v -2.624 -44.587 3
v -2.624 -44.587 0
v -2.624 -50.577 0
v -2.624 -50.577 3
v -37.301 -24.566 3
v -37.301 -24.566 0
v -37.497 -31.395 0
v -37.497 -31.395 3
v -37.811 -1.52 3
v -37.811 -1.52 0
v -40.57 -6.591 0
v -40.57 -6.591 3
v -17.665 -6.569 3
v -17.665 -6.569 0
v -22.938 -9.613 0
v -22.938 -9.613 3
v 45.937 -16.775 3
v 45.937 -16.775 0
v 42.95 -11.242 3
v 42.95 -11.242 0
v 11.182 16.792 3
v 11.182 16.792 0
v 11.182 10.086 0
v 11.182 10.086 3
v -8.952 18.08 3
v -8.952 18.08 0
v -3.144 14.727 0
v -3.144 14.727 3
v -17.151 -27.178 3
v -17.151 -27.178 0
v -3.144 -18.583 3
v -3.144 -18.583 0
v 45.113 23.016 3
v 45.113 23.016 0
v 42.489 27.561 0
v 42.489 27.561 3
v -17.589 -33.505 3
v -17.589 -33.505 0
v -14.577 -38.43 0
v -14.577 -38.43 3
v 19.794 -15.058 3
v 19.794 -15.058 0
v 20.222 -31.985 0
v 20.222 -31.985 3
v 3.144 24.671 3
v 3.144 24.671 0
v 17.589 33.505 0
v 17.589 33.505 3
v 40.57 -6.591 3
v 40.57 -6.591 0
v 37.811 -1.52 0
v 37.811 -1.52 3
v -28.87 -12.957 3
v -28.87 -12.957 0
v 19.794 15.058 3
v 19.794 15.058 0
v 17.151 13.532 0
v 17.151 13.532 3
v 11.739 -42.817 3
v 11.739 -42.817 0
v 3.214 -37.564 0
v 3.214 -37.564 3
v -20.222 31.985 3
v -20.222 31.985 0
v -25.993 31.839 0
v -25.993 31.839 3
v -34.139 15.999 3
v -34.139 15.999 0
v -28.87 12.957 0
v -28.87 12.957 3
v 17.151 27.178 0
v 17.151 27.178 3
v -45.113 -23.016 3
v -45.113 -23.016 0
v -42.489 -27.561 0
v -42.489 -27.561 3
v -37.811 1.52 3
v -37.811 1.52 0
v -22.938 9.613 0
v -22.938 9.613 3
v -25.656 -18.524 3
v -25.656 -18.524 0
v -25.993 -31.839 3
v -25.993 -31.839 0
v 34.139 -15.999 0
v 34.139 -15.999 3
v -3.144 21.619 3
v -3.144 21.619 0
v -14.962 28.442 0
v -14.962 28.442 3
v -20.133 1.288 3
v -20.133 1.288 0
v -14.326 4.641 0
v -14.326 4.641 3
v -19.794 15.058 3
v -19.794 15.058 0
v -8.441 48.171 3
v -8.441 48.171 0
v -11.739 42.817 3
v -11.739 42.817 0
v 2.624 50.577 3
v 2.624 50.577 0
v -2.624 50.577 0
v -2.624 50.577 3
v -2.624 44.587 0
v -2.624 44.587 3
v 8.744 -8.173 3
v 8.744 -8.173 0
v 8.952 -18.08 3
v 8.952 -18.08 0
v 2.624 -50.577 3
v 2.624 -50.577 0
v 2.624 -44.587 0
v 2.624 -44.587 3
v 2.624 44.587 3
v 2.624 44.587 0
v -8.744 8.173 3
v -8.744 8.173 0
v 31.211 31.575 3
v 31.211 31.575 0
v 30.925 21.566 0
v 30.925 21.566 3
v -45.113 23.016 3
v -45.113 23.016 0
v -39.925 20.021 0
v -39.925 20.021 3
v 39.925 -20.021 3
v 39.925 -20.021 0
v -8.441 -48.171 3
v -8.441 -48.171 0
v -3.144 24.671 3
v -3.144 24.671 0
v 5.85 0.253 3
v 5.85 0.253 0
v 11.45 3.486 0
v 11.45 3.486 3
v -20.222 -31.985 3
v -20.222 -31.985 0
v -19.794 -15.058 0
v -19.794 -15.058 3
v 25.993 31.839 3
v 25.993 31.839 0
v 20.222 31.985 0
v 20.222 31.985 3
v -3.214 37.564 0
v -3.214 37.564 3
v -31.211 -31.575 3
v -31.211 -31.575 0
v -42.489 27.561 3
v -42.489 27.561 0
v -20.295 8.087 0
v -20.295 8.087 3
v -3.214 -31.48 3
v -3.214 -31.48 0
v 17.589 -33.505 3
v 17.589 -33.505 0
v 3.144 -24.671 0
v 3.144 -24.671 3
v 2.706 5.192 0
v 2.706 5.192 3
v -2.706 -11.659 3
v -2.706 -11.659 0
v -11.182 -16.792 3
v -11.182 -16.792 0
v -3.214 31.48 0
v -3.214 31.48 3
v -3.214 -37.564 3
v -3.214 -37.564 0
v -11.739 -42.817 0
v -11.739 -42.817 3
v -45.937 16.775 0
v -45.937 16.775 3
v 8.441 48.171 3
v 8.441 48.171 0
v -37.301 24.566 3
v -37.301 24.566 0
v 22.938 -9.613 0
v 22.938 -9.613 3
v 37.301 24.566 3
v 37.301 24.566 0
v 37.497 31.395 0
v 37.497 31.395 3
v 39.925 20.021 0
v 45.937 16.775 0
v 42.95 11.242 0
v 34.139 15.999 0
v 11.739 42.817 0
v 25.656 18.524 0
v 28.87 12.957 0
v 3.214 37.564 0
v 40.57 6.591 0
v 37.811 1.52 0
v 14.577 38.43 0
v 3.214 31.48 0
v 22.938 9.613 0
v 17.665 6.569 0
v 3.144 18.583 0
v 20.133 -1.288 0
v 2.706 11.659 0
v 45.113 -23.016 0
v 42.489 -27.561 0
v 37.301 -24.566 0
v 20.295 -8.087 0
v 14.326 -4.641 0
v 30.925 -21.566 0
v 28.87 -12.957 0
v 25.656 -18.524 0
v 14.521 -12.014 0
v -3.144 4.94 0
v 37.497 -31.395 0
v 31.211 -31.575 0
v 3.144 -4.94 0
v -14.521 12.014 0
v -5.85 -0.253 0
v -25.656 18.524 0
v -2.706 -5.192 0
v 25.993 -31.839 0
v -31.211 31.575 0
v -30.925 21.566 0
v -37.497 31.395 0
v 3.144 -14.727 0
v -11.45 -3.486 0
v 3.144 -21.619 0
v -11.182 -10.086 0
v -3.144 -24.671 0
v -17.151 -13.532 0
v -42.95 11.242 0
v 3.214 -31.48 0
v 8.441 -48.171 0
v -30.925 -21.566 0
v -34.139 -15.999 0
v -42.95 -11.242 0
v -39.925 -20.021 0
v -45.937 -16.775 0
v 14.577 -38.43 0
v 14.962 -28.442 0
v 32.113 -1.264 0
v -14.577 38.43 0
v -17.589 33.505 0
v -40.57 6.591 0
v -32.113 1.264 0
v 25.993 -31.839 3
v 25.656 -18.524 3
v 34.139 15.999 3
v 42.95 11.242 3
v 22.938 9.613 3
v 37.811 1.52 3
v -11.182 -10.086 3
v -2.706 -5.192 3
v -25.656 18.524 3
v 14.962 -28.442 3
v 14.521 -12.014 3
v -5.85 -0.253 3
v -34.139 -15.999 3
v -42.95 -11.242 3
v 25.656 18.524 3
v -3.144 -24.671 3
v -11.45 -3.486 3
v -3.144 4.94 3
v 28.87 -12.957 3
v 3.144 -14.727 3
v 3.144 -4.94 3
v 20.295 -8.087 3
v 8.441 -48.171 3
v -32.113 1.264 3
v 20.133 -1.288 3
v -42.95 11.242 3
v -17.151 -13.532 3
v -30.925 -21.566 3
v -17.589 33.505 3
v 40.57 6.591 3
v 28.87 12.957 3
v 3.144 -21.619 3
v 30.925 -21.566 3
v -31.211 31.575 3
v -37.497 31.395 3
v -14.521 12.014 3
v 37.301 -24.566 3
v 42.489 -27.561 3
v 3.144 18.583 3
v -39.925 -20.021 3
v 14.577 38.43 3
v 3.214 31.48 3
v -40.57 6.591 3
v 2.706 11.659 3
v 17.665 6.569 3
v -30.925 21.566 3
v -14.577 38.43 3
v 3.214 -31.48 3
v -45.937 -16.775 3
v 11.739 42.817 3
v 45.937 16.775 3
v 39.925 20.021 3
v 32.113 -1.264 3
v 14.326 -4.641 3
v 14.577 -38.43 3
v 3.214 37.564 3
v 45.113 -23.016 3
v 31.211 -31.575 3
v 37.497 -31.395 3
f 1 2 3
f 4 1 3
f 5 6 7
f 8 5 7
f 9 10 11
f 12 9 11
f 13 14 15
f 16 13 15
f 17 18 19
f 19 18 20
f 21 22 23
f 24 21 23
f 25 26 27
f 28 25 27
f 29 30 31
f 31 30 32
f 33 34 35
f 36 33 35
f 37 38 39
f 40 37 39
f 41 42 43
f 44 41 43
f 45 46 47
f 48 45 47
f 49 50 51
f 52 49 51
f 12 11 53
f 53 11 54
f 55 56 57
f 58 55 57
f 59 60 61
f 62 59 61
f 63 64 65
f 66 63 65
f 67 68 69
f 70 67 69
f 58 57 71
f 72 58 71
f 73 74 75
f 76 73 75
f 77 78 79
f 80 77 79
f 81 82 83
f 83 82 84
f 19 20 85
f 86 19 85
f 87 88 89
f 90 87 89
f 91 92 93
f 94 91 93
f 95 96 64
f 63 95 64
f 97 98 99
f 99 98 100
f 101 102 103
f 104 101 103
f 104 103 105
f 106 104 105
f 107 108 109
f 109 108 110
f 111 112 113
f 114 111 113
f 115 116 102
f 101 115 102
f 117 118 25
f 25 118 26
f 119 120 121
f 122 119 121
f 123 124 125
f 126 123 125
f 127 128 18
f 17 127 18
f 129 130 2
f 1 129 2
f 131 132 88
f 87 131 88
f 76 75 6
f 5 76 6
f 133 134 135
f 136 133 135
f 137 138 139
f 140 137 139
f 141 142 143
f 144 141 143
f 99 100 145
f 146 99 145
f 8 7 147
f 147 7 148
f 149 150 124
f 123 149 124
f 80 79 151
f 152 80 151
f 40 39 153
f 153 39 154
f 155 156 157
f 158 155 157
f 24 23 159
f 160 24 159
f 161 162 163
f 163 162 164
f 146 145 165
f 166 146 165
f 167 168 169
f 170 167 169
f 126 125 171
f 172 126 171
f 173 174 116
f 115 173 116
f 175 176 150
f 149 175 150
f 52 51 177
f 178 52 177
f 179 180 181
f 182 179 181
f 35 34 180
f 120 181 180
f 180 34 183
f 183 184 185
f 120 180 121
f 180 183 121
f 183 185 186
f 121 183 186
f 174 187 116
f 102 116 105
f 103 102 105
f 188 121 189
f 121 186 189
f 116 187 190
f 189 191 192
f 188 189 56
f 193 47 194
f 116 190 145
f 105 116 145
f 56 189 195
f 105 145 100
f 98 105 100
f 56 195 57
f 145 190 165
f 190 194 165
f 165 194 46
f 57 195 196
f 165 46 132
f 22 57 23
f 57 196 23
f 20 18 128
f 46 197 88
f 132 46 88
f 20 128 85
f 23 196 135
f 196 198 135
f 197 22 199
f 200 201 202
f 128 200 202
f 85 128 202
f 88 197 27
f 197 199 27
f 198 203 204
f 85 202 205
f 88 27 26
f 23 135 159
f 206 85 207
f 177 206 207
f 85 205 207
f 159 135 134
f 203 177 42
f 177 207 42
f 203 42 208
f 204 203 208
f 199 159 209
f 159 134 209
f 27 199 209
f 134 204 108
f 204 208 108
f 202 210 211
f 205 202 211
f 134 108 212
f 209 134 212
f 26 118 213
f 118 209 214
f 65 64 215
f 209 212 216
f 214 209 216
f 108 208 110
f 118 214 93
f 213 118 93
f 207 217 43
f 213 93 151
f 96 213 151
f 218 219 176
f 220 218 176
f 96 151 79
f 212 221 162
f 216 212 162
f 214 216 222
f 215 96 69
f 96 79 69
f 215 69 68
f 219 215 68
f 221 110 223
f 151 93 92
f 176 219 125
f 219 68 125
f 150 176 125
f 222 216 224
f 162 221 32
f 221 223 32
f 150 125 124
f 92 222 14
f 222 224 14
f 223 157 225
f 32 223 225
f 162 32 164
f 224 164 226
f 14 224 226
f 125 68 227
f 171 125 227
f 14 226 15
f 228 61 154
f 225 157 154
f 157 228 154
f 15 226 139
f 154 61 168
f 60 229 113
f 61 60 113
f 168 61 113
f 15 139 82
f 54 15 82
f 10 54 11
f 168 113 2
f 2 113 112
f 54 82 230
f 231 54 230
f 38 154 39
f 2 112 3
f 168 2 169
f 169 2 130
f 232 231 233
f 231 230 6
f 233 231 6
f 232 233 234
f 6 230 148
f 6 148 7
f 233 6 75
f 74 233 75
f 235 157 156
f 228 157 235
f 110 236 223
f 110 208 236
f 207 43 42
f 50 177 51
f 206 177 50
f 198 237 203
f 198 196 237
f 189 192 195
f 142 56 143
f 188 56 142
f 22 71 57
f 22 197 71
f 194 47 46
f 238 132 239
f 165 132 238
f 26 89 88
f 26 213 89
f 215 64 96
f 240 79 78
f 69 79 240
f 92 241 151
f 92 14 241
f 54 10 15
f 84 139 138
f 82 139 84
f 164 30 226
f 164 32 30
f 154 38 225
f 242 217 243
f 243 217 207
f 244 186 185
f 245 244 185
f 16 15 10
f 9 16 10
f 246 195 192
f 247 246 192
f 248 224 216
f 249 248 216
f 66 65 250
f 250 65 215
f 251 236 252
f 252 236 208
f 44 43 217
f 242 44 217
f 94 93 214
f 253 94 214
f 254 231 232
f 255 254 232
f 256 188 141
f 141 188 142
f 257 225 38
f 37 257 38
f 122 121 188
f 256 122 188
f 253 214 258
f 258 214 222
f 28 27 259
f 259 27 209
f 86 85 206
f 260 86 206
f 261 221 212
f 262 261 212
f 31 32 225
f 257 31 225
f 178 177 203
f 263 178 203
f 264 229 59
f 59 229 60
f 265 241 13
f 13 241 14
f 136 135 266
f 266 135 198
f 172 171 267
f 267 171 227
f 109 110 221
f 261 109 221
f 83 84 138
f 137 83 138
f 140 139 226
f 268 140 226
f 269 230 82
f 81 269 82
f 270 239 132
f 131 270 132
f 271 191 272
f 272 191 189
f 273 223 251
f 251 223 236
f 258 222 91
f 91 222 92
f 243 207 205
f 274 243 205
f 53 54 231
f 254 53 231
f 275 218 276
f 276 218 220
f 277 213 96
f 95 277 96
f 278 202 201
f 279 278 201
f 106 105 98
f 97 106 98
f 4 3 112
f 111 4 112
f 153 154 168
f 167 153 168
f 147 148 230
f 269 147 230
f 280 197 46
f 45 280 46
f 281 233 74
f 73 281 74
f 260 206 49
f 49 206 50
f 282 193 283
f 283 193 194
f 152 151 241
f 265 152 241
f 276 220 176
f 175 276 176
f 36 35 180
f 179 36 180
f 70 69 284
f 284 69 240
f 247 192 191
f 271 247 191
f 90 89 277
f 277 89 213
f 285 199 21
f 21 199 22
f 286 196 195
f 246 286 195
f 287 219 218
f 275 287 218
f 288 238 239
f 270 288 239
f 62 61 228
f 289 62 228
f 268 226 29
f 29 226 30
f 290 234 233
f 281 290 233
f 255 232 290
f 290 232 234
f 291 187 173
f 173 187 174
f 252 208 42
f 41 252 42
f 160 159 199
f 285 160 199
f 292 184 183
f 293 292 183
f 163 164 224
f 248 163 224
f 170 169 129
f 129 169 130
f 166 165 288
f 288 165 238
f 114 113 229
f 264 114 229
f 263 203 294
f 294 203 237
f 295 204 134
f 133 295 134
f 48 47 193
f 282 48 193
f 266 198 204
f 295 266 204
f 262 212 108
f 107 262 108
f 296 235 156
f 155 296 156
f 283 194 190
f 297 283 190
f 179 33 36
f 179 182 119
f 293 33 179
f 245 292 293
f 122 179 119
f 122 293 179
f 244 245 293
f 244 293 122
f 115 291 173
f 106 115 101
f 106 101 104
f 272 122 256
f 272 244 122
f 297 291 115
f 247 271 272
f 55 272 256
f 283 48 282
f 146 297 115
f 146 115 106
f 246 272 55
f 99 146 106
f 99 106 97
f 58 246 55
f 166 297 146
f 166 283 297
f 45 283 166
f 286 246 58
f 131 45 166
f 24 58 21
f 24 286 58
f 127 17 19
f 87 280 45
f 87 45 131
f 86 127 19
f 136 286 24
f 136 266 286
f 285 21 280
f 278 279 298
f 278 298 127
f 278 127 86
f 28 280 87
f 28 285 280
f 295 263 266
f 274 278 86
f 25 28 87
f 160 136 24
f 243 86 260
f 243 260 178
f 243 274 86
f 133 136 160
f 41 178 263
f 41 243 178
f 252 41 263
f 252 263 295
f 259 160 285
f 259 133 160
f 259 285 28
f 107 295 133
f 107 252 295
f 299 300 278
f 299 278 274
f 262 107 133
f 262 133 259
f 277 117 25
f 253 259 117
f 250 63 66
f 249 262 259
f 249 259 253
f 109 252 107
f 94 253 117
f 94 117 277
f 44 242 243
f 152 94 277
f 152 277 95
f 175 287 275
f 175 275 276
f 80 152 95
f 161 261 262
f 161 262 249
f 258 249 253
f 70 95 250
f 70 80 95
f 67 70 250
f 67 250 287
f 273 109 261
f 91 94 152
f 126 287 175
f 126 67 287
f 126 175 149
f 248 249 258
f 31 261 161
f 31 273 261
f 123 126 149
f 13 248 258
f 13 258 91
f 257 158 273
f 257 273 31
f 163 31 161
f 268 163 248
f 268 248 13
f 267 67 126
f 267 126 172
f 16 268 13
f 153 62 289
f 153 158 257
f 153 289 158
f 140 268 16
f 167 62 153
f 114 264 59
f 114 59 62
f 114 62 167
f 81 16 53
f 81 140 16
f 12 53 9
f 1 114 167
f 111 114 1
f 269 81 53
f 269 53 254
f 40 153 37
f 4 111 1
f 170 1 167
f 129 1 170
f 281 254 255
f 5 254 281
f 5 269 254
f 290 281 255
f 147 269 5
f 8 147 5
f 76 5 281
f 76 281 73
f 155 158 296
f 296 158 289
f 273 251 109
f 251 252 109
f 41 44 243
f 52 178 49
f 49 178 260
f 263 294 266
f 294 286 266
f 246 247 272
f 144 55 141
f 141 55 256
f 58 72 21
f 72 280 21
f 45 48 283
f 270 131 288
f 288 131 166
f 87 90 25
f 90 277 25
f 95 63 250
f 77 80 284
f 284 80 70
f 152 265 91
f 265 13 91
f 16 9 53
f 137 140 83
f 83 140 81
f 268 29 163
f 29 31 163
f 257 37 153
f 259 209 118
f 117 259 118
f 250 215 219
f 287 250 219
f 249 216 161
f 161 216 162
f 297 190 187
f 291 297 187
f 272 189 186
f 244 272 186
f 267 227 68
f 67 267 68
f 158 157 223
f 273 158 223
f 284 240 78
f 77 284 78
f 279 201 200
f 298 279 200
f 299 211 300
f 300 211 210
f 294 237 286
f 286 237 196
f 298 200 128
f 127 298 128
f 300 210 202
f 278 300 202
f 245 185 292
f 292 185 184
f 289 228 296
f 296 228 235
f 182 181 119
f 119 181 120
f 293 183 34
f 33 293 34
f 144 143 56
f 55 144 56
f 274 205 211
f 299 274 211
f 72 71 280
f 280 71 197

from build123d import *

# Parameters (mm, degrees)
F2_DEPTH = 3
F4_COUNT = 6


with BuildPart() as f2:
    # F1 (on Top) → F2 (new body)
    with BuildSketch(Plane.XY):
        Polygon((-3.143853, 2.46645), (0, 0), (2.705809, 1.481498), (2.705809, 11.658775), (11.181849, 16.792152), (11.181849, 6.122341), (17.15089, 9.390539), (17.15089, 27.178286), (3.143853, 18.582864), (3.143853, 24.671286), (17.588934, 33.50547), (14.577311, 38.42988), (3.214115, 31.480487), (3.214115, 37.564415), (11.739274, 42.817172), (8.440727, 48.170671), (2.623938, 44.58667), (2.623938, 50.576929), (0, 50.576929), (-2.623938, 50.576929), (-2.623938, 44.58667), (-8.440727, 48.170671), (-11.739274, 42.817172), (-3.214115, 37.564415), (-3.214115, 31.480487), (-14.577311, 38.42988), (-17.588934, 33.50547), (-3.143853, 24.671286), align=None)
    extrude(amount=F2_DEPTH)


with BuildPart() as f4_1:
    # F4: instance of F2
    add(f2.part.rotate(Axis((0, 0, 4.922884), (0, 0, 1)), 1 * 360 / F4_COUNT))


with BuildPart() as f4_2:
    # F4: instance of F2
    add(f2.part.rotate(Axis((0, 0, 4.922884), (0, 0, 1)), 2 * 360 / F4_COUNT))


with BuildPart() as f4_3:
    # F4: instance of F2
    add(f2.part.rotate(Axis((0, 0, 4.922884), (0, 0, 1)), 3 * 360 / F4_COUNT))


with BuildPart() as f4_4:
    # F4: instance of F2
    add(f2.part.rotate(Axis((0, 0, 4.922884), (0, 0, 1)), 4 * 360 / F4_COUNT))


with BuildPart() as f4_5:
    # F4: instance of F2
    add(f2.part.rotate(Axis((0, 0, 4.922884), (0, 0, 1)), 5 * 360 / F4_COUNT))


with BuildPart() as f2_1:
    add(f2.part)

    # F5: union F4_5, F4_3, F4_1, F4_2, F4_4
    add(f4_5.part)
    add(f4_3.part)
    add(f4_1.part)
    add(f4_2.part)
    add(f4_4.part)


solid = f2_1.part
